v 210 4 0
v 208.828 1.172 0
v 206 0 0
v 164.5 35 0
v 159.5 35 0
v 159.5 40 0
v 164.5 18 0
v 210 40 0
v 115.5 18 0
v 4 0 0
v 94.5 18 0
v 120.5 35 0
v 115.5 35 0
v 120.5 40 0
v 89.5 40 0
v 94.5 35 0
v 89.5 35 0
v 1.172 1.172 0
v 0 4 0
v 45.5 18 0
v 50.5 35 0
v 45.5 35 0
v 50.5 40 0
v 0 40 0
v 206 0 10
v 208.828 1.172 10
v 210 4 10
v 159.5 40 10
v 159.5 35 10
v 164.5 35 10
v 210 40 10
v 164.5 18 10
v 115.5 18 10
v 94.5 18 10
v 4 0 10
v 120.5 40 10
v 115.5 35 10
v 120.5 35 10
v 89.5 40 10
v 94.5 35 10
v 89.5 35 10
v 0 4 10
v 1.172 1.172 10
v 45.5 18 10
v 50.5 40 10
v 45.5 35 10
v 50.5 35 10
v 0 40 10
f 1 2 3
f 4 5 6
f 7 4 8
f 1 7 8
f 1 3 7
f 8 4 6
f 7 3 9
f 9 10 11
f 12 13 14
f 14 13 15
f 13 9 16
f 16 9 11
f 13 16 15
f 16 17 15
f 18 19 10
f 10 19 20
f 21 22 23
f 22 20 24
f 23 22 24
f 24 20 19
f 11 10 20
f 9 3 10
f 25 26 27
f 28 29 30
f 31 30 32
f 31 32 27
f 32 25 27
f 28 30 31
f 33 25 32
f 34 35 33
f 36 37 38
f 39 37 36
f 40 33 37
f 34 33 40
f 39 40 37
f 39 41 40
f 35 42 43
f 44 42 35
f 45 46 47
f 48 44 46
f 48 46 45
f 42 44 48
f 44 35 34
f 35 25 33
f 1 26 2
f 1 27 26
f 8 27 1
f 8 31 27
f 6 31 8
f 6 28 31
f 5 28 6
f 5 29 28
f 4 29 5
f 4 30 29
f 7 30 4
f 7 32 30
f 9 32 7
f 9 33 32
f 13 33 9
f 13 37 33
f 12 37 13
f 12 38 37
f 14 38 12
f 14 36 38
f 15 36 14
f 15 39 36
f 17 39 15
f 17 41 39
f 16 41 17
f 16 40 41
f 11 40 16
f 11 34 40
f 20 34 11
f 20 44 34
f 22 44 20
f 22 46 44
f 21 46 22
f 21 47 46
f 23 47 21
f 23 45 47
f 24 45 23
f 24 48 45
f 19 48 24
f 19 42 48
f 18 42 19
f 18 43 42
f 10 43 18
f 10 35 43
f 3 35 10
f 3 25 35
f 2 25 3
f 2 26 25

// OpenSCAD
$fn = 32;

// ----------------------------------------------------------------------
// Oversize slot bar: 210 mm bar with 2 oversize windows
// ----------------------------------------------------------------------

// --- parameters (mm) ---
profile_height = 10;      // extrusion height
profile_points = 24;      // points of the closed outline

profile = [[0, 4], [1.172, 1.172], [4, 0], [206, 0], [208.828, 1.172], [210, 4], [210, 40], [159.5, 40], [159.5, 35], [164.5, 35], [164.5, 18], [115.5, 18], [115.5, 35], [120.5, 35], [120.5, 40], [89.5, 40], [89.5, 35], [94.5, 35], [94.5, 18], [45.5, 18], [45.5, 35], [50.5, 35], [50.5, 40], [0, 40]];  // single closed polygon, 24 points, counter clockwise

// --- the one profile operation ---
linear_extrude(height = profile_height) polygon(points = profile);
